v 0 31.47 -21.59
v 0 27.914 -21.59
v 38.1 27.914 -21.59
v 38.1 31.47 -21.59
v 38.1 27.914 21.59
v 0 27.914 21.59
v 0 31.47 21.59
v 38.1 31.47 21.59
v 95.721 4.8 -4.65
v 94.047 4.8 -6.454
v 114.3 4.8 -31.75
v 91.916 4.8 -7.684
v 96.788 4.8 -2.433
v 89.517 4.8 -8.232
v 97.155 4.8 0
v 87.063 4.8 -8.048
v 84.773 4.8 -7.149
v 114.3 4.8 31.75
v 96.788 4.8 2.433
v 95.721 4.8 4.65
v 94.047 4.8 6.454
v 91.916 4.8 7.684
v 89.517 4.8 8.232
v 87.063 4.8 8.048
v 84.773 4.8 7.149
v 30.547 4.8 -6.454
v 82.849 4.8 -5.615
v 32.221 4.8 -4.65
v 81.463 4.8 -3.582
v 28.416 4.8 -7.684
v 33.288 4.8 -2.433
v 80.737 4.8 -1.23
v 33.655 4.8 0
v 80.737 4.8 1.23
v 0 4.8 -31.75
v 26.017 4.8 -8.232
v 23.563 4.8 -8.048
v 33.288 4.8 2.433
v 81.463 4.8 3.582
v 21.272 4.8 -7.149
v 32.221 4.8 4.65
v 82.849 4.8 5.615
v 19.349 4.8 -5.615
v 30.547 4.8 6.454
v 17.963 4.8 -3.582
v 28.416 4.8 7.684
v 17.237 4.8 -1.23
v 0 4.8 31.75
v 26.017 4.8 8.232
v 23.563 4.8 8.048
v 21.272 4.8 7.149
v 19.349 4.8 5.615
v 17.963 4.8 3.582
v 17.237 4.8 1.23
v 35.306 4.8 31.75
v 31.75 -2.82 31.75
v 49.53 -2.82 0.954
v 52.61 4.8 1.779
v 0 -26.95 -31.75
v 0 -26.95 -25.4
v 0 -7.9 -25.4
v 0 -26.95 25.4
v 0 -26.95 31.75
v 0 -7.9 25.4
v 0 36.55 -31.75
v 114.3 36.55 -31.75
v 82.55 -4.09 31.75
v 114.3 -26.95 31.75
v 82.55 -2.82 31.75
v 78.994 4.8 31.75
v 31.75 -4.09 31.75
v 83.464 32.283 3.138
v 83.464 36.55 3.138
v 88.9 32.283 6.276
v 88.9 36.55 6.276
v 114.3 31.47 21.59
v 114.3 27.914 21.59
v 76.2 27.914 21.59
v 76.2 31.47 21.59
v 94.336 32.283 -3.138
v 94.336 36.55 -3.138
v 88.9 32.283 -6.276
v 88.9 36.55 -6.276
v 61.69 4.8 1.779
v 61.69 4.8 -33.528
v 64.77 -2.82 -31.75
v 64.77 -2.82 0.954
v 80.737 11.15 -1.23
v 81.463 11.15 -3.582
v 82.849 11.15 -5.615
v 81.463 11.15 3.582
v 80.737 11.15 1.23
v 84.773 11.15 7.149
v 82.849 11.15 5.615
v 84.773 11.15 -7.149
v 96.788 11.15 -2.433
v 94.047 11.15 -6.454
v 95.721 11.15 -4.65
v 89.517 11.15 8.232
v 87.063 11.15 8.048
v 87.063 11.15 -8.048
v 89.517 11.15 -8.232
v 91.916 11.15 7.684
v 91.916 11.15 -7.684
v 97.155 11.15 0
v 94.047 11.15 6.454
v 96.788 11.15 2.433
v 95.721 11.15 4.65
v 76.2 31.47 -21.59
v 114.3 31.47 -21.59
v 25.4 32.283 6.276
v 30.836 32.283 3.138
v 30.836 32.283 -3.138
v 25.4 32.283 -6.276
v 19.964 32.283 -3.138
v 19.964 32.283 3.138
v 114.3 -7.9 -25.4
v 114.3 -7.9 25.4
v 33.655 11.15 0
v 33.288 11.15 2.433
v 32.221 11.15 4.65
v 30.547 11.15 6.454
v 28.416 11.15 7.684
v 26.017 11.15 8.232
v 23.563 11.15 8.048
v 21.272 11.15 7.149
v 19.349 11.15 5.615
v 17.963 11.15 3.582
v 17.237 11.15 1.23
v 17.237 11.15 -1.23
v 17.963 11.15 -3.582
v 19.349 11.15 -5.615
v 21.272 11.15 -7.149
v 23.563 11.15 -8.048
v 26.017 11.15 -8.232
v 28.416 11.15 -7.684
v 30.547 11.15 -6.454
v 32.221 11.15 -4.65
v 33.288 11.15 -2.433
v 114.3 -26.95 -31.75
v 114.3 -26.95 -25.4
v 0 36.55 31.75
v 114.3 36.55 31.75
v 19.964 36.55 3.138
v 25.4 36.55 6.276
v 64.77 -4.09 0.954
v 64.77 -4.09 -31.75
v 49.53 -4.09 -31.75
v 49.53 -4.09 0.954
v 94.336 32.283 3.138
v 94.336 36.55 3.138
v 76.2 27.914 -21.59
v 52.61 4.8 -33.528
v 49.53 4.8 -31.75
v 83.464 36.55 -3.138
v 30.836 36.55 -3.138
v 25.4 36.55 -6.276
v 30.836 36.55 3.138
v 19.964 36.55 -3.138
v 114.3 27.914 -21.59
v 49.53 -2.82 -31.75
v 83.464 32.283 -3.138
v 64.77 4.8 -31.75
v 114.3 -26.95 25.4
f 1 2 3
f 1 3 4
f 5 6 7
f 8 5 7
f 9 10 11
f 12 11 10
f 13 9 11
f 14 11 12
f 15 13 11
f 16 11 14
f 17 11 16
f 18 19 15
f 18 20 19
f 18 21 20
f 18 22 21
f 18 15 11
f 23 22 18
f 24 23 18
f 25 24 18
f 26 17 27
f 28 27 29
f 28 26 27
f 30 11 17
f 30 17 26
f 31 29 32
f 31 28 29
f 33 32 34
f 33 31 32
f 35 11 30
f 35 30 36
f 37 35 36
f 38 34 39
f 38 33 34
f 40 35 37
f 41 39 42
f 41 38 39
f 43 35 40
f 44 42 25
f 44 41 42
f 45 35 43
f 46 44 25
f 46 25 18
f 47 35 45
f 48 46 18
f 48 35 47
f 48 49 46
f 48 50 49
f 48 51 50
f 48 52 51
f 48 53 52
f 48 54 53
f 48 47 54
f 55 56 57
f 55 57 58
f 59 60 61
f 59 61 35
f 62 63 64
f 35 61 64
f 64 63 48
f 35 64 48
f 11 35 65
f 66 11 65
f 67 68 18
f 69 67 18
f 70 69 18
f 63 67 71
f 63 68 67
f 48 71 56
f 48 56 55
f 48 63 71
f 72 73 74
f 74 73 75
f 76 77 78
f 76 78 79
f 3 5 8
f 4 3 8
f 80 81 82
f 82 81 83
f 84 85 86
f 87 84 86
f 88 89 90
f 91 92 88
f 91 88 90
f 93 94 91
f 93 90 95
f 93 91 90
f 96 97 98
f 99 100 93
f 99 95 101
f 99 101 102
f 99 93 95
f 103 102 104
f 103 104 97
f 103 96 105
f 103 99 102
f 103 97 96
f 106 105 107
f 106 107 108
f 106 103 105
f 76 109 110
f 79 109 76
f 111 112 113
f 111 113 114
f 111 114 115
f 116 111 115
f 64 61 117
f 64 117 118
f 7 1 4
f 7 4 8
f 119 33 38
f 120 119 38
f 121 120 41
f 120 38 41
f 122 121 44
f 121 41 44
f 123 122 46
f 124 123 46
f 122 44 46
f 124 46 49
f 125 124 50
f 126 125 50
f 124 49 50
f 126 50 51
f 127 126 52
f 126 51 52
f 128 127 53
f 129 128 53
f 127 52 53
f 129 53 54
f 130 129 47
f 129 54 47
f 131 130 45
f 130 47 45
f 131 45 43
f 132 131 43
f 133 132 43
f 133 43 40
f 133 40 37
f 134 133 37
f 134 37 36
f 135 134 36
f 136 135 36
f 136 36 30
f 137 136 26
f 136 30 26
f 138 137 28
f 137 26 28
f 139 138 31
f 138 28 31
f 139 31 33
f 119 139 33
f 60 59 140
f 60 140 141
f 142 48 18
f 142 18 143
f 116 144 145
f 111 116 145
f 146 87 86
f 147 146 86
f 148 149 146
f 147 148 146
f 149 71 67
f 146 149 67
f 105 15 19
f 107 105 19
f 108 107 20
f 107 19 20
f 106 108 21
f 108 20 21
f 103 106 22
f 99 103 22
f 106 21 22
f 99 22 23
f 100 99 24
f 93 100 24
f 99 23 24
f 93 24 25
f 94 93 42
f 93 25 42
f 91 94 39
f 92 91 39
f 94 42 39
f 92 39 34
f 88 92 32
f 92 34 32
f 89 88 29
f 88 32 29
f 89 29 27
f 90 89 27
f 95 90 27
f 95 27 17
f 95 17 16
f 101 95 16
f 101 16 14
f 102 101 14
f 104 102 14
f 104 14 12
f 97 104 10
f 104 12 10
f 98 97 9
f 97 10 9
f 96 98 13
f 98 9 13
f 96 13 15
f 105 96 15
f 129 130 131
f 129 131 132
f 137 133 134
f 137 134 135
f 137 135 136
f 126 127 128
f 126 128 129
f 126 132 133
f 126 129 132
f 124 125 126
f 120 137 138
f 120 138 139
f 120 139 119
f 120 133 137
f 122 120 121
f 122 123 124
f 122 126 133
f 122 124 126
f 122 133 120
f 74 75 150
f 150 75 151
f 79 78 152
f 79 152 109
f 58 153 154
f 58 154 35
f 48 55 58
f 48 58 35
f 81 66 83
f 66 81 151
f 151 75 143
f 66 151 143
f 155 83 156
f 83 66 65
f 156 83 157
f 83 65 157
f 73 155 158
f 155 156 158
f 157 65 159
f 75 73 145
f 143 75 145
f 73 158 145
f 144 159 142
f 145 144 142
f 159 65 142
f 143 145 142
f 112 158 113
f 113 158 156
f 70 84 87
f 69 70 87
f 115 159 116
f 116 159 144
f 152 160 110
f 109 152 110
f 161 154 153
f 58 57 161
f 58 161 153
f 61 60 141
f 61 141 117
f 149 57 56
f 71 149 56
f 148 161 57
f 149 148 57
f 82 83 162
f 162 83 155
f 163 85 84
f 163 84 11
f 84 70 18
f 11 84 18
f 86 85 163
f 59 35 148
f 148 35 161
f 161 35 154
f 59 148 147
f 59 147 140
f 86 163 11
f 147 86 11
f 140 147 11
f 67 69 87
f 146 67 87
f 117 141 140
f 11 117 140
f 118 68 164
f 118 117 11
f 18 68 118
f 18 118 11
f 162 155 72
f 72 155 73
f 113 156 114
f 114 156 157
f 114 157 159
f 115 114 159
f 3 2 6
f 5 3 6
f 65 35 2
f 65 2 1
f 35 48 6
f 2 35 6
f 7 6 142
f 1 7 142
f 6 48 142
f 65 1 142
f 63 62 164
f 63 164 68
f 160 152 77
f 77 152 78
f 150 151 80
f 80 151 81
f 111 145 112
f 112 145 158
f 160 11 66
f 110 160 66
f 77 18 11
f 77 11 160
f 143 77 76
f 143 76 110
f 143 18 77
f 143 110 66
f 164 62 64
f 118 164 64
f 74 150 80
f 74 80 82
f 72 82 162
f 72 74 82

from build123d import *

# Parameters (mm, degrees)
F0_W      = 31.75
F0_H      = 63.5
F1_DEPTH  = 114.3
F2_DEPTH  = 114.3
F5_W      = 3.556
F5_H      = 43.18
F6_DEPTH  = 38.1
F7_START  = 76.2
F7_DEPTH  = 38.1
F11_R     = 8.255
F12_R     = 8.255
F13_DEPTH = 6.35
F15_DEPTH = 4.2672
F16_DEPTH = 25.4
F17_START = 8.89
F17_DEPTH = 16.51
F20_START = -7.62
F19_W     = 114.3
F19_H     = 30.48
F20_DEPTH = 5.08
F22_W     = 12.7
F22_H     = 6.350000307
F22_H_2   = 6.35
F23_DEPTH = 114.3
F21_W     = 19.05
F21_H     = 6.350000307
F21_H_2   = 6.35
F24_DEPTH = 114.3


with BuildPart() as f1:
    # F0 (on Right) → F1 (new body)
    with BuildSketch(Plane.YZ):
        with Locations((20.6751725854, 0)):
            Rectangle(F0_W, F0_H)
    extrude(amount=F1_DEPTH)

    # F5 (on face) → F6 (cut)
    with BuildSketch(Plane.YZ):
        with Locations((29.6921725854, 0)):
            Rectangle(F5_W, F5_H)
    extrude(amount=F6_DEPTH, mode=Mode.SUBTRACT)

    # F5 (on face) → F7 (cut)
    with BuildSketch(Plane.YZ.offset(F7_START)):
        with Locations((29.6921725854, 0)):
            Rectangle(F5_W, F5_H)
    extrude(amount=F7_DEPTH, mode=Mode.SUBTRACT)

    # F11 (on face) + F12 (on face) → F13 (cut)
    with BuildSketch(Plane.XZ.offset(-4.8001725854)):
        with Locations((25.4, 0)):
            Circle(F11_R)
    with BuildSketch(Plane.XZ.offset(-4.8001725854)):
        with Locations((88.9, 0)):
            Circle(F12_R)
    extrude(amount=-F13_DEPTH, mode=Mode.SUBTRACT)

    # F14 (on face) → F15 (cut)
    with BuildSketch(Plane(origin=(0, 36.5501725854, 0), x_dir=(-1, 0, 0), z_dir=(0, 1, 0))):
        Polygon((-83.4644, -3.1382451232), (-83.4644, 3.1382451232), (-88.9, 6.2764902464), (-94.3356, 3.1382451232), (-94.3356, -3.1382451232), (-88.9, -6.2764902464), align=None)
        Polygon((-30.8356, 3.1382451232), (-30.8356, -3.1382451232), (-25.4, -6.2764902464), (-19.9644, -3.1382451232), (-19.9644, 3.1382451232), (-25.4, 6.2764902464), align=None)
    extrude(amount=-F15_DEPTH, mode=Mode.SUBTRACT)


with BuildPart() as f2:
    # F0 (on Right) → F2 (new body)
    with BuildSketch(Plane.YZ):
        Polygon((-26.9498274146, -19.685), (-26.9498274146, -31.75), (4.8001725854, -31.75), (4.8001725854, 31.75), (-26.9498274146, 31.75), (-26.9498274146, 19.685), (-23.3938274146, 19.685), (-7.8998274146, 8.89), (-7.8998274146, -8.89), (-23.3938274146, -19.685), align=None)
        Polygon((-26.9498274146, 19.685), (-26.9498274146, -19.685), (-23.3938274146, -19.685), (-7.8998274146, -8.89), (-7.8998274146, 8.89), (-23.3938274146, 19.685), align=None)
    extrude(amount=F2_DEPTH)


with BuildPart() as f9:
    # F9: sweep along a path in F4
    with BuildLine(Plane.XZ.offset(-4.8001725854)) as f9_path:
        Line((49.53, -31.75), (49.53, 0.9541366414))
        Line((49.53, 0.9541366414), (31.75, 31.75))
    # F8 (on face) → F9 (sweep)
    with BuildSketch(Plane.XY.offset(31.75)):
        Polygon((35.306, 4.8001725854), (31.75, 4.8001725854), (31.75, -2.8198274146), align=None)
    sweep(path=f9_path.line, transition=Transition.RIGHT)


with BuildPart() as f10:
    # F10: sweep along a path in F4
    with BuildLine(Plane.XZ.offset(-4.8001725854)) as f10_path:
        Line((82.55, 31.75), (64.77, 0.9541366414))
        Line((64.77, 0.9541366414), (64.77, -31.75))
    # F8 (on face) → F10 (sweep)
    with BuildSketch(Plane.XY.offset(31.75)):
        Polygon((82.55, -2.8198274146), (82.55, 4.8001725854), (78.994, 4.8001725854), align=None)
    sweep(path=f10_path.line, transition=Transition.RIGHT)


with BuildPart() as f16:
    # F4 (on face) → F16 (new body)
    with BuildSketch(Plane.XZ.offset(-4.8001725854)):
        Polygon((49.53, 0.9541366414), (31.75, 31.75), (0, 31.75), (0, -31.75), (49.53, -31.75), align=None)
    extrude(amount=F16_DEPTH)


with BuildPart() as f16b:
    # F4 (on face) → F16, piece 2 (new body)
    with BuildSketch(Plane.XZ.offset(-4.8001725854)):
        Polygon((114.3, 31.75), (82.55, 31.75), (64.77, 0.9541366414), (64.77, -31.75), (114.3, -31.75), align=None)
    extrude(amount=F16_DEPTH)


with BuildPart() as f17:
    # F4 (on face) → F17 (new body)
    with BuildSketch(Plane.XZ.offset(-4.8001725854).offset(F17_START)):
        Polygon((57.15, -31.75), (57.15, 31.75), (31.75, 31.75), (49.53, 0.9541366414), (49.53, -31.75), align=None)
        Polygon((82.55, 31.75), (57.15, 31.75), (57.15, -31.75), (64.77, -31.75), (64.77, 0.9541366414), align=None)
    extrude(amount=F17_DEPTH)


with BuildPart() as f9_1:
    add(f9.part)

    # F18: union F10, F16, F16b, F17
    add(f10.part)
    add(f16.part)
    add(f16b.part)
    add(f17.part)

    # F19 (on face) → F20 (cut)
    with BuildSketch(Plane.XZ.offset(20.5998274146).offset(F20_START)):
        with Locations((57.15, 0)):
            Rectangle(F19_W, F19_H)
    extrude(amount=-F20_DEPTH, mode=Mode.SUBTRACT)

    # F22 (on face) → F23 (cut)
    with BuildSketch(Plane.YZ):
        Polygon((-7.8998274146, 25.399999693), (-20.5998274146, 25.399999693), (-20.5998274146, 17.7383606557), (-7.8998274146, 8.89), align=None)
        with Locations((-14.2498274146, 28.5749998465)):
            Rectangle(F22_W, F22_H)
        Polygon((-7.8998274146, 8.89), (-20.5998274146, 17.7383606557), (-20.5998274146, -17.7383606557), (-7.8998274146, -8.89), align=None)
        Polygon((-7.8998274146, -8.89), (-20.5998274146, -17.7383606557), (-20.5998274146, -25.4), (-7.8998274146, -25.4), align=None)
        with Locations((-14.2498274146, -28.575)):
            Rectangle(F22_W, F22_H_2)
    extrude(amount=F23_DEPTH, mode=Mode.SUBTRACT)

    # F21 (on face) → F24 (join)
    with BuildSketch(Plane.YZ):
        with Locations((-17.4248274146, 28.5749998465)):
            Rectangle(F21_W, F21_H)
        with Locations((-17.4248274146, -28.575)):
            Rectangle(F21_W, F21_H_2)
    extrude(amount=F24_DEPTH)


solid = Compound([f1.part, f9_1.part])
